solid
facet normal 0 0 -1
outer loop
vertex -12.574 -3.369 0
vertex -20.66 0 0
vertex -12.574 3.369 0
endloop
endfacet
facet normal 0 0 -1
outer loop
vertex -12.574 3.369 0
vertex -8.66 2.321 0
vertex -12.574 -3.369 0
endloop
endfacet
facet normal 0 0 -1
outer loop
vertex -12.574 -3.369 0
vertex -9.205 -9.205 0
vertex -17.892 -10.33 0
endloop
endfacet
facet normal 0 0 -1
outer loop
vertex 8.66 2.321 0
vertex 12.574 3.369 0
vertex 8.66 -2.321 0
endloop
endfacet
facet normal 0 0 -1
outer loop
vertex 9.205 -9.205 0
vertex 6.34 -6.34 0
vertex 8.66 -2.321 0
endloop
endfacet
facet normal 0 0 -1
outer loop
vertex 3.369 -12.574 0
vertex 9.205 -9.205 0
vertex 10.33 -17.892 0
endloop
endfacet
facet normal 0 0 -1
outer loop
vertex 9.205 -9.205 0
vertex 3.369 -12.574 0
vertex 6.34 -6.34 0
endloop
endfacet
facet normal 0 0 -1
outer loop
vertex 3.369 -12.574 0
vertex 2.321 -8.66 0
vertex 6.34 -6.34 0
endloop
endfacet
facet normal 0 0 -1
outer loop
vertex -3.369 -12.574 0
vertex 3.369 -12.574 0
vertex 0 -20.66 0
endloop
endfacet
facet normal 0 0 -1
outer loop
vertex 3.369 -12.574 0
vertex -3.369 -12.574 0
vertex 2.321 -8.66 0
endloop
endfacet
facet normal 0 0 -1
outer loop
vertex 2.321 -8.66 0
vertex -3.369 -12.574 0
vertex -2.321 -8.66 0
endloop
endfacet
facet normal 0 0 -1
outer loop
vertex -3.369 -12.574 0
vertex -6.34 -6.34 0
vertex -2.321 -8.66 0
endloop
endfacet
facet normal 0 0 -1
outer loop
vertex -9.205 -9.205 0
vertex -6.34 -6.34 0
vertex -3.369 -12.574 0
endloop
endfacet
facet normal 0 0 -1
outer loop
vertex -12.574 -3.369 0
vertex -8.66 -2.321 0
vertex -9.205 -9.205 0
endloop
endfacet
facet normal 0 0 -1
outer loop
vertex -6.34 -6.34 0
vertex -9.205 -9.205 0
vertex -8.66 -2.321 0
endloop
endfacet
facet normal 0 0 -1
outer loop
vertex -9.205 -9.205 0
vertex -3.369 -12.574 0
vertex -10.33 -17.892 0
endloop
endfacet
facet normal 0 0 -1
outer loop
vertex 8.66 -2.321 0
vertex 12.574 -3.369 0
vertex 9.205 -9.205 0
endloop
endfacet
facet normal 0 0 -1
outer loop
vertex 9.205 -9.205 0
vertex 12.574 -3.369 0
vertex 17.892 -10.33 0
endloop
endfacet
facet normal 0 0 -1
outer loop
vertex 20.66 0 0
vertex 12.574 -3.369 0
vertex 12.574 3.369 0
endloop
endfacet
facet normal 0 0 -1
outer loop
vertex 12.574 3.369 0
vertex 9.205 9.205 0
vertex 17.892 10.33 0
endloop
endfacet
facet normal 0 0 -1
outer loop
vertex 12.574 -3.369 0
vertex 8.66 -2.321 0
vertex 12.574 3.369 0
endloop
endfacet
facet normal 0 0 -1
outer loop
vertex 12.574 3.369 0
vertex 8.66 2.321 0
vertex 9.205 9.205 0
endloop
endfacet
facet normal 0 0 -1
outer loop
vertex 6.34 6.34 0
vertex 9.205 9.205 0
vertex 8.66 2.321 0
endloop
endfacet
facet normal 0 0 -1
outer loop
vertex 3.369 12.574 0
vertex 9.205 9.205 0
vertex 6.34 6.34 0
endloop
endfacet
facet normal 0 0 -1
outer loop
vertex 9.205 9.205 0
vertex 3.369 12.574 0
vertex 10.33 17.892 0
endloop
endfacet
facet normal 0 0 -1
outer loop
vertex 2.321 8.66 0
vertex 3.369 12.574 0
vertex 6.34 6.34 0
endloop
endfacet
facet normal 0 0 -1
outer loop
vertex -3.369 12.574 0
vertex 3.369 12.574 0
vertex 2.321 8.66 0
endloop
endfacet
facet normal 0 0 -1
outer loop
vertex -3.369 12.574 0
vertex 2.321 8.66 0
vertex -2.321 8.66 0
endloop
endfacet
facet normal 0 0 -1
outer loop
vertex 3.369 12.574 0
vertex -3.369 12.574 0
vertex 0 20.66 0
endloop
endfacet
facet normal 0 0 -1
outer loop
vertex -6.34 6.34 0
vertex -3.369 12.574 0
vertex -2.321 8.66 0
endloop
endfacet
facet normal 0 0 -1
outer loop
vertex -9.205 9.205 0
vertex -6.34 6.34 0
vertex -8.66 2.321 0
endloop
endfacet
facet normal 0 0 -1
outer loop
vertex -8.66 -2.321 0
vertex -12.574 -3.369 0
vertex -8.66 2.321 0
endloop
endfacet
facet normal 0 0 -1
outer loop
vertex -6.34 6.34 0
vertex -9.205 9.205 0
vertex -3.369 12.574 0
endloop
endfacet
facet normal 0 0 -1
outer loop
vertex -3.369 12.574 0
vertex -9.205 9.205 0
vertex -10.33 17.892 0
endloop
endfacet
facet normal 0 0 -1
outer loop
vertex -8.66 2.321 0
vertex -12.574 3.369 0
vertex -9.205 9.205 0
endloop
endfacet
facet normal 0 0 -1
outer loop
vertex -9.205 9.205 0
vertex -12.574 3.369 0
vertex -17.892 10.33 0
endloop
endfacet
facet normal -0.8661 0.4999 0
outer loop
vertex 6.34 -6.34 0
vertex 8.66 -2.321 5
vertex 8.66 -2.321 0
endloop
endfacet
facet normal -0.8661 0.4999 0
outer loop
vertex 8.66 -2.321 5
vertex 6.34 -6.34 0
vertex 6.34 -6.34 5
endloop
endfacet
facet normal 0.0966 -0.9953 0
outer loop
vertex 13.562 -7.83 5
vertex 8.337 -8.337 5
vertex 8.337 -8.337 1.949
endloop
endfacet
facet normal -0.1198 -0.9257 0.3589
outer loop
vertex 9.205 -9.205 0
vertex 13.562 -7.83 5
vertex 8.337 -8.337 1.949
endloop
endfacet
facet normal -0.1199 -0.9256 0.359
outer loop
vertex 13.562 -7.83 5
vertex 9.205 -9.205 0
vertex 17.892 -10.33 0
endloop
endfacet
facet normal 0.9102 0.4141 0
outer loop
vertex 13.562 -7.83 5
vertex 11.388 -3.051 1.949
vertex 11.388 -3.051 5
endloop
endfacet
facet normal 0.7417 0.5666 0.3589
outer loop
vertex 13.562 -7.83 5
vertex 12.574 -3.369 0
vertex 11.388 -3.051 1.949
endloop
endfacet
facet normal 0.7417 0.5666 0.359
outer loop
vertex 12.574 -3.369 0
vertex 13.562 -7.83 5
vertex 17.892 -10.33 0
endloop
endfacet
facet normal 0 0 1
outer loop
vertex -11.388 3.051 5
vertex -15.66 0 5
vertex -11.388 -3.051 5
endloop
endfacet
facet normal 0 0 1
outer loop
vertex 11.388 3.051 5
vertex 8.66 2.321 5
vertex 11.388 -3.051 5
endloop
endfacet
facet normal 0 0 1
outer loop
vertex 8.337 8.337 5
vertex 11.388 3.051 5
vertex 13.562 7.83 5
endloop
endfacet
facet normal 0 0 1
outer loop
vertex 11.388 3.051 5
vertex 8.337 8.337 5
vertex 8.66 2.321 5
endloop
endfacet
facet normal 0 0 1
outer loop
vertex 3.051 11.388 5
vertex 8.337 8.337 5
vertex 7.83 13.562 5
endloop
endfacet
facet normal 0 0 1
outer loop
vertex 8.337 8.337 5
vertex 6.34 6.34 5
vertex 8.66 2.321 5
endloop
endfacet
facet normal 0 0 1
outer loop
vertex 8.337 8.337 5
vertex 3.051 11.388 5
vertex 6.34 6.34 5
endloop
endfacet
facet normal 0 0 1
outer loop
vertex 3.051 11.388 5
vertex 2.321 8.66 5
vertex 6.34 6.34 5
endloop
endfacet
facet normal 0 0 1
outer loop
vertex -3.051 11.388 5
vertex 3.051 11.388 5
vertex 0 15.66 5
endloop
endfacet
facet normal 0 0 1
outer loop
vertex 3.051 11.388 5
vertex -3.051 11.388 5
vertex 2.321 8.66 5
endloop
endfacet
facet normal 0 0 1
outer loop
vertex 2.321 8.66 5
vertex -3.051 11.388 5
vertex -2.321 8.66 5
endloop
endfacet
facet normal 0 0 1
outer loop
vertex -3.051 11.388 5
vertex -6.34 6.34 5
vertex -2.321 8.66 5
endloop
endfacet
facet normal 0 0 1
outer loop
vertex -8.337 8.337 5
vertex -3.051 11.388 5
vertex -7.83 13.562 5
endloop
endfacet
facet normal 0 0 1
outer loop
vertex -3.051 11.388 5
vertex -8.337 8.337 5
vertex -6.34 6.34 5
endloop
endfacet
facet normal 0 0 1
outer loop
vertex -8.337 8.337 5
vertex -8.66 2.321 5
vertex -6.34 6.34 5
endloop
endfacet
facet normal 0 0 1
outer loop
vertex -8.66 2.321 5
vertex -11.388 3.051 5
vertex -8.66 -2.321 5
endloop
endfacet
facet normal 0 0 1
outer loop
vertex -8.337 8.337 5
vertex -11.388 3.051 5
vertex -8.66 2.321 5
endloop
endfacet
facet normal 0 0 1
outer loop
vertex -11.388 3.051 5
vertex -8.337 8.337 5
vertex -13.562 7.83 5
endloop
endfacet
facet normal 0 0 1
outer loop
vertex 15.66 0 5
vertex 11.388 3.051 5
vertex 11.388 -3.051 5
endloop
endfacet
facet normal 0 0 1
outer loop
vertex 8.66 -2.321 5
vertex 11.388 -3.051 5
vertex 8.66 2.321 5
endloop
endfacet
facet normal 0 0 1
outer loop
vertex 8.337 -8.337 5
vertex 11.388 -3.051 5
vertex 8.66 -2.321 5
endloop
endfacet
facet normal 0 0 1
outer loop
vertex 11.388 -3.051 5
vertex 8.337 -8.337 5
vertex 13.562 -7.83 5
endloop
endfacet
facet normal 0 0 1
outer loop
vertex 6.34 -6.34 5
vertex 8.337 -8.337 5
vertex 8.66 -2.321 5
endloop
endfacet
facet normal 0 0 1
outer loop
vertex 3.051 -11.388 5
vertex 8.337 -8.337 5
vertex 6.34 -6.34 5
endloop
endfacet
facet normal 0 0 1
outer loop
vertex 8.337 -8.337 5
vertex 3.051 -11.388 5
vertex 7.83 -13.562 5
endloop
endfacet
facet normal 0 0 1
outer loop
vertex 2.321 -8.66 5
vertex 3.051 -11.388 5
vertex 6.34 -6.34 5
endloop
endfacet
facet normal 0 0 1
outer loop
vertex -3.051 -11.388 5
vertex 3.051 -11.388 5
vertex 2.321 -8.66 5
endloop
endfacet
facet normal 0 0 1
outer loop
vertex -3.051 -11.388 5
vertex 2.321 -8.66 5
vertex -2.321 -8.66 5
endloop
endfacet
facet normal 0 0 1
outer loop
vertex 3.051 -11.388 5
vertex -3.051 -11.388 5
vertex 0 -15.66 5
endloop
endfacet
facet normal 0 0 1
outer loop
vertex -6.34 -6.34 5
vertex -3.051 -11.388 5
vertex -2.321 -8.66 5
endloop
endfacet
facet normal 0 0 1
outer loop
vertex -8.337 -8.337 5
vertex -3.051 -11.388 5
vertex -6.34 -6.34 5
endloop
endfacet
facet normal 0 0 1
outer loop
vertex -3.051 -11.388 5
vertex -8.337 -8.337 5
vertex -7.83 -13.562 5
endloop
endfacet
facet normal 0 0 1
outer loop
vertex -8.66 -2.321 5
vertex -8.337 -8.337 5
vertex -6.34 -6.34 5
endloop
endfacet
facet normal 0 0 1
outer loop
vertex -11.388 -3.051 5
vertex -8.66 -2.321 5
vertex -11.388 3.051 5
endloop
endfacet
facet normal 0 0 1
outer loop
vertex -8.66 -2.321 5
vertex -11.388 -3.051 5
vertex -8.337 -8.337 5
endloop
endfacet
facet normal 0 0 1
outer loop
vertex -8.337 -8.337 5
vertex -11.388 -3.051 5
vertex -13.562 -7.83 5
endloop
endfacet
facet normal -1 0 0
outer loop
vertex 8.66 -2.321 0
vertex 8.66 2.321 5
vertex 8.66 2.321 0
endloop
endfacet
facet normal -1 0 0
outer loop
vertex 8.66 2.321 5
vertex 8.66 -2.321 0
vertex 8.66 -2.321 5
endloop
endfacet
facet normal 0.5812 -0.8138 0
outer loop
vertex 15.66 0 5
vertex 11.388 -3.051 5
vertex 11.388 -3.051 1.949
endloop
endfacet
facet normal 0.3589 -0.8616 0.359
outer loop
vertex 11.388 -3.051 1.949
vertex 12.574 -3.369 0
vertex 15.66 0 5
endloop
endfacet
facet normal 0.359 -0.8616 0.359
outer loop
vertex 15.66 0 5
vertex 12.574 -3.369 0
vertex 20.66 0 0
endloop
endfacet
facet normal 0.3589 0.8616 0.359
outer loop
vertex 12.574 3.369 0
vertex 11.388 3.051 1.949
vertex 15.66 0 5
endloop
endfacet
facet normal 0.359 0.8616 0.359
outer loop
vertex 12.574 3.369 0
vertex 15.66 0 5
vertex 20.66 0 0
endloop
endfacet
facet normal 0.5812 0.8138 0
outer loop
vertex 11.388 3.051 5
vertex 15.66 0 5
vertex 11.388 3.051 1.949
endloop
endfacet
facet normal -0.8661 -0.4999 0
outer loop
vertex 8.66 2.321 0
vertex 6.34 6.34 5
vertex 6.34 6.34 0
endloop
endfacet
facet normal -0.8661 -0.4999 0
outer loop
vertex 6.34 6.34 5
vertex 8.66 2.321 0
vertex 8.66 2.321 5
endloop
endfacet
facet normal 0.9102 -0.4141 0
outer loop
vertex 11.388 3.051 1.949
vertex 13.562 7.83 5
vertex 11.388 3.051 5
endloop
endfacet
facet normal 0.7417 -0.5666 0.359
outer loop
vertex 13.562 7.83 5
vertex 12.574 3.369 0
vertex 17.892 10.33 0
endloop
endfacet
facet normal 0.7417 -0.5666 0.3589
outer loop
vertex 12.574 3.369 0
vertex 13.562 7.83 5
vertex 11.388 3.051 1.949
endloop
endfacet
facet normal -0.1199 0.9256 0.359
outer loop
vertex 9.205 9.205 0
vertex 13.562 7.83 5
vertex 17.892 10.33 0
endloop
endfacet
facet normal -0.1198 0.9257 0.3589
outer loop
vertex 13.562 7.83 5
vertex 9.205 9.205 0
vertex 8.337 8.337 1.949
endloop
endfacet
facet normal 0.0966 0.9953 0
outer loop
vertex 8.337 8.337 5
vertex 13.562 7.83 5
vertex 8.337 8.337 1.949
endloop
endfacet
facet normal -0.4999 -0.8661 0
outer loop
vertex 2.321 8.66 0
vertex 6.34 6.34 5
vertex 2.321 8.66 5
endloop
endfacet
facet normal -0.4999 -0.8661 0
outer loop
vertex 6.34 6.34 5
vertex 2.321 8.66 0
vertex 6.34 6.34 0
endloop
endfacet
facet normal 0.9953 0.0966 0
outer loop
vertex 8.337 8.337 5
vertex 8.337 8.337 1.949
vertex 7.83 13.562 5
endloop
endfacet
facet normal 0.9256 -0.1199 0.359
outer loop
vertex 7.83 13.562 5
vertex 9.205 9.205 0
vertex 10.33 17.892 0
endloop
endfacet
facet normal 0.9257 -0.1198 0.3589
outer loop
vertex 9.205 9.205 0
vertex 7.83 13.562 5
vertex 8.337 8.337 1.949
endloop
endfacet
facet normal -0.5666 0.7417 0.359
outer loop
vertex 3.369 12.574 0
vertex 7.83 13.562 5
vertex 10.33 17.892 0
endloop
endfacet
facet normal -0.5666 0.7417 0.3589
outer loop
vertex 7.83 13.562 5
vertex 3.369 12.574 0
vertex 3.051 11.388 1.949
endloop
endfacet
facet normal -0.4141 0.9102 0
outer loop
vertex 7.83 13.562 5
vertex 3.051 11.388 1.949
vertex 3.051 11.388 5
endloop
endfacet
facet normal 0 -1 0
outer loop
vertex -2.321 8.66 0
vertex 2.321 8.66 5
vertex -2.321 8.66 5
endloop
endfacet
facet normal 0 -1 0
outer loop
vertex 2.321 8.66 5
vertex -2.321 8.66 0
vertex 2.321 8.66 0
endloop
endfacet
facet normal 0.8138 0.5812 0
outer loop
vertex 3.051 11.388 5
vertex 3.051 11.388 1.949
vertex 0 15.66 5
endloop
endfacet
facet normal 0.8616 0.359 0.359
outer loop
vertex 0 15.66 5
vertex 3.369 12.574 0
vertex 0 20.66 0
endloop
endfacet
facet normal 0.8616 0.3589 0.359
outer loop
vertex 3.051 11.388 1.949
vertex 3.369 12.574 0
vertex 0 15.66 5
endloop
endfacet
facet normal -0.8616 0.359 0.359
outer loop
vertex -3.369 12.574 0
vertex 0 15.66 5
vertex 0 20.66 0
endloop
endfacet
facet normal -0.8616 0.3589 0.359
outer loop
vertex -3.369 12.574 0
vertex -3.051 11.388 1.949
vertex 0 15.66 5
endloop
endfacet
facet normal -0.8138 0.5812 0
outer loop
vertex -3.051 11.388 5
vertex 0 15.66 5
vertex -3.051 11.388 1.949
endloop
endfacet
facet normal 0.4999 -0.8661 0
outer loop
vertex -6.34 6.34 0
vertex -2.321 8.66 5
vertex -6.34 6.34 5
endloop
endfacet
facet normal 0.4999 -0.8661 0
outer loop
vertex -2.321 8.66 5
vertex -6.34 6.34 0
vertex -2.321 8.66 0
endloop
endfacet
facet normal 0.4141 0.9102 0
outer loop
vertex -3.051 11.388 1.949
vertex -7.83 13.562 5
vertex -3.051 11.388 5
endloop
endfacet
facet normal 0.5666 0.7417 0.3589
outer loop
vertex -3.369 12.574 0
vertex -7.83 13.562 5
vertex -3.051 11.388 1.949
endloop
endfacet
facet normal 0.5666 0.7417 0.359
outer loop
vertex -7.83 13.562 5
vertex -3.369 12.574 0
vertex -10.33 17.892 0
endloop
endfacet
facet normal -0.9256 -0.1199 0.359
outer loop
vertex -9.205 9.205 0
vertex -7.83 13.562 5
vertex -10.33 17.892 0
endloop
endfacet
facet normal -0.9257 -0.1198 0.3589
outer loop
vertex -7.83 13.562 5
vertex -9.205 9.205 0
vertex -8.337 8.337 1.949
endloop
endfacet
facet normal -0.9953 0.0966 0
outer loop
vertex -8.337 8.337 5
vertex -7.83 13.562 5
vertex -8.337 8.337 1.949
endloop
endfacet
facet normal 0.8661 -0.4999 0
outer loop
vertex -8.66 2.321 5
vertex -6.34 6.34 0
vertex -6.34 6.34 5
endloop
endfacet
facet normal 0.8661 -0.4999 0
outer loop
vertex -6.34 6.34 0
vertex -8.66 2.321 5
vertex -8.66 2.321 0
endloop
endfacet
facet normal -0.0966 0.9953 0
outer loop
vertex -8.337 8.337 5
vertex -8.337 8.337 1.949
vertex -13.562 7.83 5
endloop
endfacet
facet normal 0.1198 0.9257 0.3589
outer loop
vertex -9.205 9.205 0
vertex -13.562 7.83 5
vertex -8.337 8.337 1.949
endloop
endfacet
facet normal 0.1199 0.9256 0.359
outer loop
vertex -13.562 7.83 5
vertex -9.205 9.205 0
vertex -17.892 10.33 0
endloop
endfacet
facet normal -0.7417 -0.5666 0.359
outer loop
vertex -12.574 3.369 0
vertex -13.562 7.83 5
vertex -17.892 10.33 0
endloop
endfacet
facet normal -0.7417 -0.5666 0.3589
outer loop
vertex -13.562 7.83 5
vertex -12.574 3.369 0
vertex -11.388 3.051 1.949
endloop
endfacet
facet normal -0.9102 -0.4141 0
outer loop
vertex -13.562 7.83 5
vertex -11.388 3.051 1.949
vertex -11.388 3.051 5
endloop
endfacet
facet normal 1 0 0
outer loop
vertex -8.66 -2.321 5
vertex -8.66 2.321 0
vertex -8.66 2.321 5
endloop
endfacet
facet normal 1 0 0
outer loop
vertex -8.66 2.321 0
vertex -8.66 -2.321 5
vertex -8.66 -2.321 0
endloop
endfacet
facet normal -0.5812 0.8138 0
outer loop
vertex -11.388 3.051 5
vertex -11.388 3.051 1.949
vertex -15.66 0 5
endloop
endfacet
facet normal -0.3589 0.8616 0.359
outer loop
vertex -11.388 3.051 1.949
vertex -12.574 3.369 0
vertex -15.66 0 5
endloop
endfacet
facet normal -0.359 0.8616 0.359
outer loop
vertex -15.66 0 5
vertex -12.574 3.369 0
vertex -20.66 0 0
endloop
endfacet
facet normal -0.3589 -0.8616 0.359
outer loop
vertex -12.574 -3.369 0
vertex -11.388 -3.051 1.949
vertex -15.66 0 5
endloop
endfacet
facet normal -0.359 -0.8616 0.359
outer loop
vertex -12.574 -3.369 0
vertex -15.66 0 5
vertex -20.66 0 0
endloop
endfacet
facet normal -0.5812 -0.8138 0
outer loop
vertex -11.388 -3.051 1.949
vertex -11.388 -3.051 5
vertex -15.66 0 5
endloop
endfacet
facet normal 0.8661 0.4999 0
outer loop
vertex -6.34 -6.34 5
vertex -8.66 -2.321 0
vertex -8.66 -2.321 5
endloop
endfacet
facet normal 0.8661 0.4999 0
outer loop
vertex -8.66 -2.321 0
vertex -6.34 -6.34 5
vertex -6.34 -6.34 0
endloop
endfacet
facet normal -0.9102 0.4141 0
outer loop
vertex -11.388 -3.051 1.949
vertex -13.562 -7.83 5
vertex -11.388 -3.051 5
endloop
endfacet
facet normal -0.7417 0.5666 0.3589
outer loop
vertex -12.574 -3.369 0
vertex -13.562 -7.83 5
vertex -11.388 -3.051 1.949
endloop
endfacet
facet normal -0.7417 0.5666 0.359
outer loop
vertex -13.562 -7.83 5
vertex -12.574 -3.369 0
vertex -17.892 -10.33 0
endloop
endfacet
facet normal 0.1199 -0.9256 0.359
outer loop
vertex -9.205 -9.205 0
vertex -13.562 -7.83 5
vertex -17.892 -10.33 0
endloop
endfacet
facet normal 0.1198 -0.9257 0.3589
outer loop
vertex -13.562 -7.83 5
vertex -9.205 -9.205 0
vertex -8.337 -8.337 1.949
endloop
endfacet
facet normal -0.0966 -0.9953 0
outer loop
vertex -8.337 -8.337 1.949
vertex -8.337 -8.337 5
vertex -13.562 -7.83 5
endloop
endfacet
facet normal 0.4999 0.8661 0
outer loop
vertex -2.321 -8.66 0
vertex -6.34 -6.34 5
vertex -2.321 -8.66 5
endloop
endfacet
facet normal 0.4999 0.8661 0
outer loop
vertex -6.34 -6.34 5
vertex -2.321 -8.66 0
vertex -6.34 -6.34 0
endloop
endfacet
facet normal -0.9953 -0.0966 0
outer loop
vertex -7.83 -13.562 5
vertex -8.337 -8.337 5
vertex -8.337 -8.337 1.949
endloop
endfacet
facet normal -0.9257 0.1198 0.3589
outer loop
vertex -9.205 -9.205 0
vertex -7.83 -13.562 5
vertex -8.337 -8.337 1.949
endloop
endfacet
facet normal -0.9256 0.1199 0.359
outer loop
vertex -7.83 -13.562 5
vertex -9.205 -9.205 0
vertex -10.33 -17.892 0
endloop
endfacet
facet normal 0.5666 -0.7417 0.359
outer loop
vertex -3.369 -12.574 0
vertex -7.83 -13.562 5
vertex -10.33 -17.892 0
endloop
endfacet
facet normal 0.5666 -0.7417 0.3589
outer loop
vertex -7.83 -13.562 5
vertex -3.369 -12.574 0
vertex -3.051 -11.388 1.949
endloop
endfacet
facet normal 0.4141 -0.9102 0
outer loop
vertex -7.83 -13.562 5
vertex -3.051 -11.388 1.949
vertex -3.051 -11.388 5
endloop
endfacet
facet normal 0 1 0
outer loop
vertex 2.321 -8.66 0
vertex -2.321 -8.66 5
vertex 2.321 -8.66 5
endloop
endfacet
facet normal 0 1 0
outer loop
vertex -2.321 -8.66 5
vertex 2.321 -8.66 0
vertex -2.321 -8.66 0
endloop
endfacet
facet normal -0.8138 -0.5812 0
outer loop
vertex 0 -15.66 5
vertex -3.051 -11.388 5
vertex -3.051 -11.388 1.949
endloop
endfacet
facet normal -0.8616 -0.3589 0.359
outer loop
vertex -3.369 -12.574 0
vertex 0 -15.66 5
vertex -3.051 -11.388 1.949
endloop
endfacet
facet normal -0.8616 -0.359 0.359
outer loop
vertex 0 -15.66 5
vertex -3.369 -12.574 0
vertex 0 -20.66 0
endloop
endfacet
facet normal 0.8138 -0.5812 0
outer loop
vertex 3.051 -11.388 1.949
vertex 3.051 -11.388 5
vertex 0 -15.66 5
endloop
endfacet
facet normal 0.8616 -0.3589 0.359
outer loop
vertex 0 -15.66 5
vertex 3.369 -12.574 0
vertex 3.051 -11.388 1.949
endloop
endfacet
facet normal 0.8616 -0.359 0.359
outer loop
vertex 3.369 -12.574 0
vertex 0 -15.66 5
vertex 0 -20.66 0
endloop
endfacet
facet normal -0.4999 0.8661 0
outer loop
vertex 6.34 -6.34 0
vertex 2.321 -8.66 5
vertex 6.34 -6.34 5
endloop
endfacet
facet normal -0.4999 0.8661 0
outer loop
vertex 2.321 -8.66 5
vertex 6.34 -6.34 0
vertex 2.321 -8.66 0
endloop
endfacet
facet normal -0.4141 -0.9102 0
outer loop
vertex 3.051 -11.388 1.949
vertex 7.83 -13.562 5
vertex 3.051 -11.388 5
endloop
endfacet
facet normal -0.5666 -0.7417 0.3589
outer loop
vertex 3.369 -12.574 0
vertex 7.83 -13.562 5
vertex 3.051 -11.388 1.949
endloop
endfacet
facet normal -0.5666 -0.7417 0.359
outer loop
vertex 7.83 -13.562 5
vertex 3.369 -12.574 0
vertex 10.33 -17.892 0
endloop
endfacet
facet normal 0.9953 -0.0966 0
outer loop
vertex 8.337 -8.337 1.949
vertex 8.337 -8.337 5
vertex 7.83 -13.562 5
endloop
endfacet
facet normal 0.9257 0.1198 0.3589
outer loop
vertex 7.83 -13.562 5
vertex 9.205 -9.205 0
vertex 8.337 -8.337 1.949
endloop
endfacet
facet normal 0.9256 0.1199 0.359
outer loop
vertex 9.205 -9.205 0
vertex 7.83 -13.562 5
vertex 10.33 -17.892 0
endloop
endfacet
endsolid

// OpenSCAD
Points = 12;
Step = 360/Points;
Depth = 5;
Base = 10;
Height = 12;

// Triangle is a 3d isosceles triangle using depth, base and height

module starPoint(base, height, depth) {
tpoints = [ [ 0, 0, 0 ], [ base, 0, 0 ], [ base / 2, height, 0 ],
  [ 0, 0, depth ], [ base, 0, depth ], [ base / 2, height - depth, depth ] ];

tfaces = [ [ 0, 1, 2 ], [ 3, 4, 1, 0 ], [ 4, 5, 2, 1 ], [5, 3, 0, 2 ], [ 5, 4, 3 ] ];

polyhedron(points = tpoints, faces = tfaces, convexity = 10);
}

//starPoint(base=Base, height=Height, depth=Depth);


for ( i = [0:1:Points]) {
    deg = i * Step;
      translate([Base*cos(deg),Base*sin(deg), 0]) {
         rotate(deg-120) {
        starPoint(base=Base, height=Height, depth=Depth);
   }
    }
}
